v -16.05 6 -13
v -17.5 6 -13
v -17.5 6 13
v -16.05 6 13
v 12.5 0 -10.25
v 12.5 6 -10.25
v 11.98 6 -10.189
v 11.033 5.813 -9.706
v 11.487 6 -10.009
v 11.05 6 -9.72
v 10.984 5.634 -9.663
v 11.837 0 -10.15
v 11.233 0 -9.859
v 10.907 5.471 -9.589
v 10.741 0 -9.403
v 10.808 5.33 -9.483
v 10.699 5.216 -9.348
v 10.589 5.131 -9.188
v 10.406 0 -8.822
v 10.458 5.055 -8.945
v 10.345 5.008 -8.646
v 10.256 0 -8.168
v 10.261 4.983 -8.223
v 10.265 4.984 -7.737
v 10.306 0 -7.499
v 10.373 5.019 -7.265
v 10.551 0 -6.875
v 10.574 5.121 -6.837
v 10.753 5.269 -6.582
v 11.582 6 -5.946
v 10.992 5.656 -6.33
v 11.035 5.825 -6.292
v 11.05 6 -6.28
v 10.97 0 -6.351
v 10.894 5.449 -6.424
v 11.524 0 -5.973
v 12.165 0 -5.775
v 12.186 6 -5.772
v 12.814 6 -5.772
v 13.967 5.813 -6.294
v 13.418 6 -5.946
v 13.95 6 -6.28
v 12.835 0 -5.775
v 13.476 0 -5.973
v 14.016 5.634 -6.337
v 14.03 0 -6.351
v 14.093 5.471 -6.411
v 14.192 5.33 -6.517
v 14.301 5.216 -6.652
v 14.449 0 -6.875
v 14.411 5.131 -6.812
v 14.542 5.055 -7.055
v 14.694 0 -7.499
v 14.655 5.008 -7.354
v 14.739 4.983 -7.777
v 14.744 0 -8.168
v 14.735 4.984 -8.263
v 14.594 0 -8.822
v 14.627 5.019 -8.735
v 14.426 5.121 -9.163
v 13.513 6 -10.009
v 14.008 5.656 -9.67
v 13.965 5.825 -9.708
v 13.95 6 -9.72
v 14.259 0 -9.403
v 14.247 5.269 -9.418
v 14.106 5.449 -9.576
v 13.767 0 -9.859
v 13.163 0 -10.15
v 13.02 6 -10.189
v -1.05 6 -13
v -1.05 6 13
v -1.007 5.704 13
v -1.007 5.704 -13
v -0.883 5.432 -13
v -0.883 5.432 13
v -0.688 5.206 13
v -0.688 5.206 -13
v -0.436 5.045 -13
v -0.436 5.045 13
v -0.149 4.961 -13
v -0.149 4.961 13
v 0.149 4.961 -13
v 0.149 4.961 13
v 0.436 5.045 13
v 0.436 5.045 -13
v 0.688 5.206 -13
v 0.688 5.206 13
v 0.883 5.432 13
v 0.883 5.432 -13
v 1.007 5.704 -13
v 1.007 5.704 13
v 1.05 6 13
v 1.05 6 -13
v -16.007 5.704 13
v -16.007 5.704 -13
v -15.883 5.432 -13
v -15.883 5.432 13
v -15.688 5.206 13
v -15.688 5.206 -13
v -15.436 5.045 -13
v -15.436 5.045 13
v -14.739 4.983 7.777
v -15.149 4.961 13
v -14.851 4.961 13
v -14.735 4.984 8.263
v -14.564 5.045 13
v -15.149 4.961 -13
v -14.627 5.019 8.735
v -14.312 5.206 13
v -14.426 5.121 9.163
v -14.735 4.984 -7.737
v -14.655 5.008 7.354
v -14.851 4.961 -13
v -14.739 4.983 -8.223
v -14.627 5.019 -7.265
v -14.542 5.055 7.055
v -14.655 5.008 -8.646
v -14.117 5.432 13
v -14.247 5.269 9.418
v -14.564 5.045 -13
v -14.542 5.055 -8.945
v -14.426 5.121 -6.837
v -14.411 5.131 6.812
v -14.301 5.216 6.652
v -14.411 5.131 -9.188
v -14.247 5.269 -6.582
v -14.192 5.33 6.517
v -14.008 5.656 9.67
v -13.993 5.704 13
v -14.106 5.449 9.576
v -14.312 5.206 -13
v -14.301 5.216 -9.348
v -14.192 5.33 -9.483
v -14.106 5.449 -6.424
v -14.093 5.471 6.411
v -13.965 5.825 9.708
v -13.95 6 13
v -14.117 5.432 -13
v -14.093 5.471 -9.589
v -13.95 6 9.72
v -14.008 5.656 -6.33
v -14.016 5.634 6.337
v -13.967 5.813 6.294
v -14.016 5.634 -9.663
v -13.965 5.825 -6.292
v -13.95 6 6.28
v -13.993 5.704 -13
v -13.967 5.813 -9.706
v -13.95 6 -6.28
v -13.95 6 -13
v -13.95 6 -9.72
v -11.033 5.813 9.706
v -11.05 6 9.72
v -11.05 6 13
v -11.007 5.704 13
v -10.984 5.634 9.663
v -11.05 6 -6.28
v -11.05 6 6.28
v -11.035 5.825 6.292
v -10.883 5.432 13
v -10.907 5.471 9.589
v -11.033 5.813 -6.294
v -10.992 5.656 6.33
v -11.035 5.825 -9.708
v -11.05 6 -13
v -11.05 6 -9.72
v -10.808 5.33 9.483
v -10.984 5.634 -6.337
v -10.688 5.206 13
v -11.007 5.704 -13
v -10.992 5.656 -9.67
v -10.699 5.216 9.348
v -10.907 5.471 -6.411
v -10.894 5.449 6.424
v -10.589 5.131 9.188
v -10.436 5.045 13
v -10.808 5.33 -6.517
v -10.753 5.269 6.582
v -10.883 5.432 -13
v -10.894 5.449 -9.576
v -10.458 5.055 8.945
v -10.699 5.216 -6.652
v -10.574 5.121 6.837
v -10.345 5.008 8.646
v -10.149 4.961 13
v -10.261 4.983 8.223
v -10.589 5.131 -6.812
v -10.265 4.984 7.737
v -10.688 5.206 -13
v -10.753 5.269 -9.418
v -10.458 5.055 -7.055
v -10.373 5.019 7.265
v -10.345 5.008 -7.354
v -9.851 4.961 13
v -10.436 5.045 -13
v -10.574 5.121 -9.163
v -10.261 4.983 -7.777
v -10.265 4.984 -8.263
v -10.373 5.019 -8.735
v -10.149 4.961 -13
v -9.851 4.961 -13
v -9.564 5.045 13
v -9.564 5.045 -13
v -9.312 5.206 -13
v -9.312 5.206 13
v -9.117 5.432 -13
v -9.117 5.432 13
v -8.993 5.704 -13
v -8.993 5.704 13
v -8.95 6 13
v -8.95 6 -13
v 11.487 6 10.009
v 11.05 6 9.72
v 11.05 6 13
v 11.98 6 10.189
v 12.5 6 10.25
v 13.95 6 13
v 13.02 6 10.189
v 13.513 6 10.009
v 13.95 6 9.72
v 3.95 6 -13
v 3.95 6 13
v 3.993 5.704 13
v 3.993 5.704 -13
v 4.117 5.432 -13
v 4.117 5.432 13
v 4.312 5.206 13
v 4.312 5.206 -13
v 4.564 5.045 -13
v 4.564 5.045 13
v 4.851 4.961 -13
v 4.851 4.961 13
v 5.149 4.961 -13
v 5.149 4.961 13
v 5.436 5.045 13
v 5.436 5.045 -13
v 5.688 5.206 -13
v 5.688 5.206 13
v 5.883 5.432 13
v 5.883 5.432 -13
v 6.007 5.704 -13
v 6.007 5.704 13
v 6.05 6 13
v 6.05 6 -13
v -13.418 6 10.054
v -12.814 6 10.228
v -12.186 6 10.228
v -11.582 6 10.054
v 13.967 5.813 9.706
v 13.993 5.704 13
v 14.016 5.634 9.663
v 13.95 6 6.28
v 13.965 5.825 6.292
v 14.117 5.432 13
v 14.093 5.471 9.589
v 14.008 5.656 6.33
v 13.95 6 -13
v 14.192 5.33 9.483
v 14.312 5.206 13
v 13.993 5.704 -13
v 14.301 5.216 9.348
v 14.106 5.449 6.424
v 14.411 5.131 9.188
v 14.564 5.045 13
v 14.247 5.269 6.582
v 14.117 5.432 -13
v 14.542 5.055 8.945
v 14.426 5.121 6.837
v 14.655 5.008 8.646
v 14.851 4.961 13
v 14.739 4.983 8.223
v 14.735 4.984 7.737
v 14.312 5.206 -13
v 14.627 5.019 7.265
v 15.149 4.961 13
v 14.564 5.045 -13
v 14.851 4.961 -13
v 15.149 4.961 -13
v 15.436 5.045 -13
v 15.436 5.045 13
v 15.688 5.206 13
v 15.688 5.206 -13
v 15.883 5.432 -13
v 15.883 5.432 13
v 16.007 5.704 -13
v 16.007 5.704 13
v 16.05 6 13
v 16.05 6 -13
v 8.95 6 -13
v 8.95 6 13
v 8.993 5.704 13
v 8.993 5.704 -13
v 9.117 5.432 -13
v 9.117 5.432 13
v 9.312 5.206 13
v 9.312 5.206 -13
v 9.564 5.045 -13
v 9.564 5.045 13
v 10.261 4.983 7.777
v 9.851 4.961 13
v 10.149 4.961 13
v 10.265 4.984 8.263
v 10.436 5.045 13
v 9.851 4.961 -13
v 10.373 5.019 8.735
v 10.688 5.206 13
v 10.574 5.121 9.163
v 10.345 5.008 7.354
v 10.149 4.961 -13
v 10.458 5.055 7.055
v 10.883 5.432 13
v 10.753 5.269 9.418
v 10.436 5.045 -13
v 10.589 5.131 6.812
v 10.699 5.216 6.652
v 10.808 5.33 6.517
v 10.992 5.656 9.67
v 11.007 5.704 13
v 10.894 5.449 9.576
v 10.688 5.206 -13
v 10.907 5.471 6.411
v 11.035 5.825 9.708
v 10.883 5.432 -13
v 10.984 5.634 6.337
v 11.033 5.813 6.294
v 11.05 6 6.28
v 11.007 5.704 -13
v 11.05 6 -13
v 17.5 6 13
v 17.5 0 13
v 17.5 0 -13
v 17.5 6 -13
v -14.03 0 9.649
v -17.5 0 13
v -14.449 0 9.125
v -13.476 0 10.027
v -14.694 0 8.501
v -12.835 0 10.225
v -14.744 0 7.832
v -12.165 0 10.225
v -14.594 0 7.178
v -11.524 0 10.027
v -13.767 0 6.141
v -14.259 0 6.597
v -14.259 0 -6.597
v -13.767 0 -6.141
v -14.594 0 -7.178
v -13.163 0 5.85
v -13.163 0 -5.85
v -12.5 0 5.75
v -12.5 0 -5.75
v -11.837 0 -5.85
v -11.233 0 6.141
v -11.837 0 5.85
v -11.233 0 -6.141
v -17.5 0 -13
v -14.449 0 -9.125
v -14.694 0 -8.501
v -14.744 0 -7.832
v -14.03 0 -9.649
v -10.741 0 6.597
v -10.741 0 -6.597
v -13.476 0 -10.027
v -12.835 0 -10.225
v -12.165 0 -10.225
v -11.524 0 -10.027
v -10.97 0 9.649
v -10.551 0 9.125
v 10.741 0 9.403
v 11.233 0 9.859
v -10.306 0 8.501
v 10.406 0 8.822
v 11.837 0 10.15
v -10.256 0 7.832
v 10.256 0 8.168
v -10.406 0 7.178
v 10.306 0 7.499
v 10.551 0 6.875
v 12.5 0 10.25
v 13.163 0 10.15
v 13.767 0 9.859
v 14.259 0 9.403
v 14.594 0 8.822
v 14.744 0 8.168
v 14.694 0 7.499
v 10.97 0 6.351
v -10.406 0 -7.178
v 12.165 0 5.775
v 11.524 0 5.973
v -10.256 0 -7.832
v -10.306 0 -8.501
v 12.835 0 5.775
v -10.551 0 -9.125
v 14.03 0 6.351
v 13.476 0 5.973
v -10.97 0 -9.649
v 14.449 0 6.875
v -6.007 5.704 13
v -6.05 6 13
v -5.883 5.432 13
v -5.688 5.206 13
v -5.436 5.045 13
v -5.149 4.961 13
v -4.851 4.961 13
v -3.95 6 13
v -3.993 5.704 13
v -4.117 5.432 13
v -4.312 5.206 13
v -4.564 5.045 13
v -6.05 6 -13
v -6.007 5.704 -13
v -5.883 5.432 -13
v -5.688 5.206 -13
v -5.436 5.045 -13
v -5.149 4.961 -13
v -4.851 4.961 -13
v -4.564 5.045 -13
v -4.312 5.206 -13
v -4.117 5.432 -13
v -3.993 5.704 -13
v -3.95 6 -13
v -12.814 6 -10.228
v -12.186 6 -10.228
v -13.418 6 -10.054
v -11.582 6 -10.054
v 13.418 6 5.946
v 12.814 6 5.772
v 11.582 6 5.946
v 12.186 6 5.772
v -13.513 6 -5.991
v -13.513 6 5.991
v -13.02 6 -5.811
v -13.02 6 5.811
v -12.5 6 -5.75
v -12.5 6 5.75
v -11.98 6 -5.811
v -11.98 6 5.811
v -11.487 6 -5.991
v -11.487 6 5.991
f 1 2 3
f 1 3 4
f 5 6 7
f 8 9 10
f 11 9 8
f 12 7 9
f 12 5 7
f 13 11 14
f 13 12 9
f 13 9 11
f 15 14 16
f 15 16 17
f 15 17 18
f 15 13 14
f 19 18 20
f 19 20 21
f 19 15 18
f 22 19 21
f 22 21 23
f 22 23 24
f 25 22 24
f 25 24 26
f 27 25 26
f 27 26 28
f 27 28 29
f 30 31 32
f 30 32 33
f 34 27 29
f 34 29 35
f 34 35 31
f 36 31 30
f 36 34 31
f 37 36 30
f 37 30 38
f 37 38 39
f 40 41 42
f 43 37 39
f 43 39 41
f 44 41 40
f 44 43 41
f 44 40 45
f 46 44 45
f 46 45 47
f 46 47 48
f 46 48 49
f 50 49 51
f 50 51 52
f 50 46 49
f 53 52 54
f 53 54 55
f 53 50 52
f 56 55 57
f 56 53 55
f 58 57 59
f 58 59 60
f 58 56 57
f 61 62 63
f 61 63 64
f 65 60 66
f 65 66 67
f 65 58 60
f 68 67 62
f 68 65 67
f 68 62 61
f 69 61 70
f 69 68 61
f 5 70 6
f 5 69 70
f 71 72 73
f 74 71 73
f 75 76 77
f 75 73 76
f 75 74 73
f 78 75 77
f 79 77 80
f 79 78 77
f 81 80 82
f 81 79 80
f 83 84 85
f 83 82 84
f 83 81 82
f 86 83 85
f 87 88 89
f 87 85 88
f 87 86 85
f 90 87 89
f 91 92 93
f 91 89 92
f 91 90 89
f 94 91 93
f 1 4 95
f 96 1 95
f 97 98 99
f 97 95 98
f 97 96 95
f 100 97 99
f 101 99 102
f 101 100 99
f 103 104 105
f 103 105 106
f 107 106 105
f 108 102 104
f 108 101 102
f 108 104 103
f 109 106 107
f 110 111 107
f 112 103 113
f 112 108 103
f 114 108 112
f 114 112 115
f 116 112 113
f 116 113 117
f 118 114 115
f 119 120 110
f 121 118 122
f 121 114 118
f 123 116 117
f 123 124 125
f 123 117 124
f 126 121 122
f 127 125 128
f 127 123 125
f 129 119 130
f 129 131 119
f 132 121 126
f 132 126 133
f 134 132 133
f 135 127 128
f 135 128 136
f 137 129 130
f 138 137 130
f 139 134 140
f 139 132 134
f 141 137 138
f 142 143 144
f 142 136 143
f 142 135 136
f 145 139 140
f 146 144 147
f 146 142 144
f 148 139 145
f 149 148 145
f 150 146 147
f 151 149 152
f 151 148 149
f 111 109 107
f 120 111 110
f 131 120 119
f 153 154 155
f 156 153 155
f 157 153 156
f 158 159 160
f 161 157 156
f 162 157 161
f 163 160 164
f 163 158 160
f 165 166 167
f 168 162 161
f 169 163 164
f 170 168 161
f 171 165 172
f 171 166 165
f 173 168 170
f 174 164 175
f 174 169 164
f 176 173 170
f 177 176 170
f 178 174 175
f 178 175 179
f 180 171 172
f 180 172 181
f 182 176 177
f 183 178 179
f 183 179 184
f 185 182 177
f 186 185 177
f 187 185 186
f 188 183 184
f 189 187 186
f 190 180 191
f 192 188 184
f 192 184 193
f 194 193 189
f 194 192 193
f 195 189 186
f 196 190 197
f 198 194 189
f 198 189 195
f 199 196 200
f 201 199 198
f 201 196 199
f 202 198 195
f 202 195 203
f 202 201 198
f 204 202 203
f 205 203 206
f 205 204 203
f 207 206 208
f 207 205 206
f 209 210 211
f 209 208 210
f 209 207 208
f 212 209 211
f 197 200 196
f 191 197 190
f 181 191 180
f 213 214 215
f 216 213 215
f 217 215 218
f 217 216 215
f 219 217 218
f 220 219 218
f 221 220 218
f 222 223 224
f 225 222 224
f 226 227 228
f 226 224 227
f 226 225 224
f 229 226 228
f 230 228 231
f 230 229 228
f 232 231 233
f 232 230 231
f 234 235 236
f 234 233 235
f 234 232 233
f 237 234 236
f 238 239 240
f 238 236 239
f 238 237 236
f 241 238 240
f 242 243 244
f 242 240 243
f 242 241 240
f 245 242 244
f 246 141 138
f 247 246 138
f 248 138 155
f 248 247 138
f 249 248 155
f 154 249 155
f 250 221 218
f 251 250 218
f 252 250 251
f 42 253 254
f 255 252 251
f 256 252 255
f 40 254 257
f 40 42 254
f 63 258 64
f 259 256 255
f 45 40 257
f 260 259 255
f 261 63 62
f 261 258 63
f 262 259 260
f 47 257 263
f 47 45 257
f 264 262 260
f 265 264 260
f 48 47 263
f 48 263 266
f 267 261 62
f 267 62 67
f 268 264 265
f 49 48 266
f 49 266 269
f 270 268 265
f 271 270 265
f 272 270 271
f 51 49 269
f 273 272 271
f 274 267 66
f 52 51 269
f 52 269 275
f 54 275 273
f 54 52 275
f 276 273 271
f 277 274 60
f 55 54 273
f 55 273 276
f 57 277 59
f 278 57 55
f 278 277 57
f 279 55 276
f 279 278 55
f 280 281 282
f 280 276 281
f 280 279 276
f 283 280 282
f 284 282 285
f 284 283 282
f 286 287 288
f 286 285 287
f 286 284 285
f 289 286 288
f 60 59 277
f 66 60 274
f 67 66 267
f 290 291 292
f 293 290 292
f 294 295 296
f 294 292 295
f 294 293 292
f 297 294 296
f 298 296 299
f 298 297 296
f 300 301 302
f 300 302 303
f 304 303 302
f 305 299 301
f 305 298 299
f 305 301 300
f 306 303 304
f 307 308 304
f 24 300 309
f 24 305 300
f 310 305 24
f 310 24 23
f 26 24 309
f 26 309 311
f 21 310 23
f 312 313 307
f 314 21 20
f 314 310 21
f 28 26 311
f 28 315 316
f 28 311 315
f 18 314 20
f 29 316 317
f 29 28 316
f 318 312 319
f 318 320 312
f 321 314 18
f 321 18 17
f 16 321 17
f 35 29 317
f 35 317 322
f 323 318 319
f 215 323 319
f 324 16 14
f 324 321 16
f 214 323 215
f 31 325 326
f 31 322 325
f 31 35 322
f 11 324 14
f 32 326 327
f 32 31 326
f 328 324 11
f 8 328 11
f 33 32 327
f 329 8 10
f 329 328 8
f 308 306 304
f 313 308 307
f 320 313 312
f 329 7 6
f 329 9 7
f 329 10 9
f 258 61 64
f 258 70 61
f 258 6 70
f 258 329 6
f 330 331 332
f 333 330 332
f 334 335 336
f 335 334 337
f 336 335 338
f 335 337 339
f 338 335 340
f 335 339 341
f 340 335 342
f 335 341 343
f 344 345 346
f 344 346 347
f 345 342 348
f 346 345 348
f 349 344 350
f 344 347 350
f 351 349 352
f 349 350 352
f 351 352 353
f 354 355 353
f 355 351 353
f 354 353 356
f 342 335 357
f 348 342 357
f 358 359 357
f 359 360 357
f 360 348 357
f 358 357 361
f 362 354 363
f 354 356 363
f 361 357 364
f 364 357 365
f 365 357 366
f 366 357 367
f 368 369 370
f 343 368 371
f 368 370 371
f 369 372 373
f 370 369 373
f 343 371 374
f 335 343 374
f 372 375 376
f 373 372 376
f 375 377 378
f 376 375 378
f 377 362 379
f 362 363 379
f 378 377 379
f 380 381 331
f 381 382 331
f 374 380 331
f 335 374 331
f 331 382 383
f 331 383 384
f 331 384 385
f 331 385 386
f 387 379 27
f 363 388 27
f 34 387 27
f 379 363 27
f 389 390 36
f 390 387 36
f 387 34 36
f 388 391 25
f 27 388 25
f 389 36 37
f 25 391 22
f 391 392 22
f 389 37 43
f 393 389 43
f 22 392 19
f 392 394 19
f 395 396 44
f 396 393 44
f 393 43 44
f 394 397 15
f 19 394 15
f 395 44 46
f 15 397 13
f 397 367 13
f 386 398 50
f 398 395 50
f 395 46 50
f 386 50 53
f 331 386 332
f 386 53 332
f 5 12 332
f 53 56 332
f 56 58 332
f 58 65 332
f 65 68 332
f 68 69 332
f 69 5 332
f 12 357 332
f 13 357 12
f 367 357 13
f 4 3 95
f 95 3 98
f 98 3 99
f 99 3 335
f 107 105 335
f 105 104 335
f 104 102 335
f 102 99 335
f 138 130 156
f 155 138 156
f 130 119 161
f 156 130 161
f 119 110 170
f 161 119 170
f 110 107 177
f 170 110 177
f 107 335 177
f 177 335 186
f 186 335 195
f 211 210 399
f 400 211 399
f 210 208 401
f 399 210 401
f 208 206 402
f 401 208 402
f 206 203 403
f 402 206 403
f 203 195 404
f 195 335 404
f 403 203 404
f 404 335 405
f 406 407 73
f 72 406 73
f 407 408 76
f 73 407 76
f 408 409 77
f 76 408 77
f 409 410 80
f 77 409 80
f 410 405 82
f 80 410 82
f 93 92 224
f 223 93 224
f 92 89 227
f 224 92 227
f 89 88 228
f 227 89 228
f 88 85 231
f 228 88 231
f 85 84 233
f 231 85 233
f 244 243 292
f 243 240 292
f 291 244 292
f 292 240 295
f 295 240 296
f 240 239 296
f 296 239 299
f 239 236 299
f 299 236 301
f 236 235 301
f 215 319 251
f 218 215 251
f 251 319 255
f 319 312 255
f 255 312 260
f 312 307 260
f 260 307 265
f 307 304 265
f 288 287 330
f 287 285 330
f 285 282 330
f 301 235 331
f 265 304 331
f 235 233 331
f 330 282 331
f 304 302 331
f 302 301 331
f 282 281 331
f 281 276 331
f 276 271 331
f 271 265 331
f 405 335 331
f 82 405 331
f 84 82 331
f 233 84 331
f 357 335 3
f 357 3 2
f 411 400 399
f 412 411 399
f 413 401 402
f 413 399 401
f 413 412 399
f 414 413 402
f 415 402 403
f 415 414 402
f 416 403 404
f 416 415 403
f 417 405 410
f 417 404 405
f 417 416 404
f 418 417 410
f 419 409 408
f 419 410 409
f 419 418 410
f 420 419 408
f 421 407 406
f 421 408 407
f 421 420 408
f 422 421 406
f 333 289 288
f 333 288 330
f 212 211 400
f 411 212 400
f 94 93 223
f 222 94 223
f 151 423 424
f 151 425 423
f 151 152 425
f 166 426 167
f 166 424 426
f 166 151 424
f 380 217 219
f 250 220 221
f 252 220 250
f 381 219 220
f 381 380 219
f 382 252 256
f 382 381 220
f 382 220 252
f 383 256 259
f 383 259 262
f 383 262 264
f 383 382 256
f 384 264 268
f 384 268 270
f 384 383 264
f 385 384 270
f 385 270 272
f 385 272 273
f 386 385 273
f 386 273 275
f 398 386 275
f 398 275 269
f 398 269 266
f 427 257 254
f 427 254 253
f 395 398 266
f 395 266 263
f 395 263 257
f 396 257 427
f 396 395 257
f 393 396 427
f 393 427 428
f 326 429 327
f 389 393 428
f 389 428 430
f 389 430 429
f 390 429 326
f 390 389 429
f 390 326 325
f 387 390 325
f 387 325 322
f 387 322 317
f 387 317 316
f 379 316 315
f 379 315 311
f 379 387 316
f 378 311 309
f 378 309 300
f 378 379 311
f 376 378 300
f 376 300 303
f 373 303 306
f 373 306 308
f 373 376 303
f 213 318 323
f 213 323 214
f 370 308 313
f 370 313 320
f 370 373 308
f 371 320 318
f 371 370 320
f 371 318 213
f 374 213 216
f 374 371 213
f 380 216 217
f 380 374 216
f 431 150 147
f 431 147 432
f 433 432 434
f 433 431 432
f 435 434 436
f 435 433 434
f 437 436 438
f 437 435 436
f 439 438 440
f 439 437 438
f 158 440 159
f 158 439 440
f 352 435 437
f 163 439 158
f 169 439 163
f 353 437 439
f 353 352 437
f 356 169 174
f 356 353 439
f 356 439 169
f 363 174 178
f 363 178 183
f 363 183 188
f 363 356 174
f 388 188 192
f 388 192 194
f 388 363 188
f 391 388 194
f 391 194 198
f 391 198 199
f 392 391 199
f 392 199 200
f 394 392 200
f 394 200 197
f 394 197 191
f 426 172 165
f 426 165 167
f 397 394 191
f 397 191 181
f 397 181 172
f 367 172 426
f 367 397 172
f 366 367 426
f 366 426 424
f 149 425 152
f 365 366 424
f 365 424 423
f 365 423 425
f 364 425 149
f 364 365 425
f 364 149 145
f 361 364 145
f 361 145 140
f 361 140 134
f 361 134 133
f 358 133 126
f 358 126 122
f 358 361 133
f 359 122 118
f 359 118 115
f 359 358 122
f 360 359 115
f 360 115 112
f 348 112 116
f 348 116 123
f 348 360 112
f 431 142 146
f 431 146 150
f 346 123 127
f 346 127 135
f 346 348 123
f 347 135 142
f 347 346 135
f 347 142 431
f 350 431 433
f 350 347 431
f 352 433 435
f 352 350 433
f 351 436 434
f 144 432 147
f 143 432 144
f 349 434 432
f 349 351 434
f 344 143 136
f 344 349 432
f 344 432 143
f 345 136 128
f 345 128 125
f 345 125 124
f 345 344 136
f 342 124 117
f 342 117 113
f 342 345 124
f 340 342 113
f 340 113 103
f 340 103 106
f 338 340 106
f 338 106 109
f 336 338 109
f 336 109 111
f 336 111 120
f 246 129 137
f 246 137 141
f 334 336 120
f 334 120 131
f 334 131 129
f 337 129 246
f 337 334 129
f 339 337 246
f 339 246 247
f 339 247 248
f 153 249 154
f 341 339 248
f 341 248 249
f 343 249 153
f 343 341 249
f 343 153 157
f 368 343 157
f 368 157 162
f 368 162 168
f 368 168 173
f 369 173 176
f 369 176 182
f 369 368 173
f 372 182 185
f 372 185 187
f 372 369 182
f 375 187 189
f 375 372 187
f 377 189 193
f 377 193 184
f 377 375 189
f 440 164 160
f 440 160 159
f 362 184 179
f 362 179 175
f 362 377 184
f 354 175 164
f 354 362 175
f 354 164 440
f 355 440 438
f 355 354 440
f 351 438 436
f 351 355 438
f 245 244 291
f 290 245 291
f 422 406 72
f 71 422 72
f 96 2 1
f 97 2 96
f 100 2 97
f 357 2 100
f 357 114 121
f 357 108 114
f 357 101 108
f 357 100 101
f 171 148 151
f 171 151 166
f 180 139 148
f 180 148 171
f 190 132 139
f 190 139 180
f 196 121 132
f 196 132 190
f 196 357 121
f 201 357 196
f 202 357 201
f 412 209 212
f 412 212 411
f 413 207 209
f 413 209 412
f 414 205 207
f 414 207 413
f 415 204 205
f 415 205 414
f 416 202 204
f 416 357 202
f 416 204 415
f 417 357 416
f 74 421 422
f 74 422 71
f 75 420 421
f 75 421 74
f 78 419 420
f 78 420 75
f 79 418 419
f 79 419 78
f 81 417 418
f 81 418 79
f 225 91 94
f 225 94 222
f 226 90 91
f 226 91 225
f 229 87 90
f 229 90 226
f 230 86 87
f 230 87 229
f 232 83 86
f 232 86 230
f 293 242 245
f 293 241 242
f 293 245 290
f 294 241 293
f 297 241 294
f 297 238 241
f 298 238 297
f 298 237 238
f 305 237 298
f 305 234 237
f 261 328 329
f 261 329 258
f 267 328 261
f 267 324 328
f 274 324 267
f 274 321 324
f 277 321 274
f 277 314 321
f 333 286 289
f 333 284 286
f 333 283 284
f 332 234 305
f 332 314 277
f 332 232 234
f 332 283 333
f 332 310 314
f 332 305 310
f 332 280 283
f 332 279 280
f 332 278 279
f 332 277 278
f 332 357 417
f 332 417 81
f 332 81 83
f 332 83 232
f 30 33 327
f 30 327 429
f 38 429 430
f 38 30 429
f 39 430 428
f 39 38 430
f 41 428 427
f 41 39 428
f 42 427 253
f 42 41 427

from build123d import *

# Parameters (mm, degrees)
SKETCH_1_W               = 35
SKETCH_1_H               = 26
SKETCH_1_R               = 2.25
EXTRUDE_1_DEPTH          = 6
CUT_EXTRUDE_1_DEPTH      = 23.610838109
CUT_EXTRUDE_1_DEPTH_BACK = 23.610838109
SKETCH_3_R               = 1.05


with BuildPart() as part:
    # 草图1 → 凸台-拉伸1 (new body)
    with BuildSketch(Plane(origin=(0, 0, 0), x_dir=(1, 0, 0), z_dir=(0, 1, 0))):
        Rectangle(SKETCH_1_W, SKETCH_1_H)
        with Locations(Location((-12.5, 8, 0), (0, 0, 270))):
            Circle(SKETCH_1_R, mode=Mode.SUBTRACT)
        with Locations(Location((12.5, 8, 0), (0, 0, 90))):
            Circle(SKETCH_1_R, mode=Mode.SUBTRACT)
        with Locations(Location((-12.5, -8, 0), (0, 0, 90))):
            Circle(SKETCH_1_R, mode=Mode.SUBTRACT)
        with Locations(Location((12.5, -8, 0), (0, 0, 270))):
            Circle(SKETCH_1_R, mode=Mode.SUBTRACT)
    extrude(amount=EXTRUDE_1_DEPTH)

    # 草图3 → 切除-拉伸1 (cut, two sides: drawn at the far end of the back side and taken through both)
    with BuildSketch(Plane.XY.offset(-CUT_EXTRUDE_1_DEPTH_BACK)):
        with Locations((0, 6)):
            Circle(SKETCH_3_R)
        with Locations((5, 6)):
            Circle(SKETCH_3_R)
        with Locations((10, 6)):
            Circle(SKETCH_3_R)
        with Locations((15, 6)):
            Circle(SKETCH_3_R)
        with Locations((-5, 6)):
            Circle(SKETCH_3_R)
        with Locations((-10, 6)):
            Circle(SKETCH_3_R)
        with Locations((-15, 6)):
            Circle(SKETCH_3_R)
    extrude(amount=CUT_EXTRUDE_1_DEPTH + CUT_EXTRUDE_1_DEPTH_BACK, mode=Mode.SUBTRACT)


solid = part.part
